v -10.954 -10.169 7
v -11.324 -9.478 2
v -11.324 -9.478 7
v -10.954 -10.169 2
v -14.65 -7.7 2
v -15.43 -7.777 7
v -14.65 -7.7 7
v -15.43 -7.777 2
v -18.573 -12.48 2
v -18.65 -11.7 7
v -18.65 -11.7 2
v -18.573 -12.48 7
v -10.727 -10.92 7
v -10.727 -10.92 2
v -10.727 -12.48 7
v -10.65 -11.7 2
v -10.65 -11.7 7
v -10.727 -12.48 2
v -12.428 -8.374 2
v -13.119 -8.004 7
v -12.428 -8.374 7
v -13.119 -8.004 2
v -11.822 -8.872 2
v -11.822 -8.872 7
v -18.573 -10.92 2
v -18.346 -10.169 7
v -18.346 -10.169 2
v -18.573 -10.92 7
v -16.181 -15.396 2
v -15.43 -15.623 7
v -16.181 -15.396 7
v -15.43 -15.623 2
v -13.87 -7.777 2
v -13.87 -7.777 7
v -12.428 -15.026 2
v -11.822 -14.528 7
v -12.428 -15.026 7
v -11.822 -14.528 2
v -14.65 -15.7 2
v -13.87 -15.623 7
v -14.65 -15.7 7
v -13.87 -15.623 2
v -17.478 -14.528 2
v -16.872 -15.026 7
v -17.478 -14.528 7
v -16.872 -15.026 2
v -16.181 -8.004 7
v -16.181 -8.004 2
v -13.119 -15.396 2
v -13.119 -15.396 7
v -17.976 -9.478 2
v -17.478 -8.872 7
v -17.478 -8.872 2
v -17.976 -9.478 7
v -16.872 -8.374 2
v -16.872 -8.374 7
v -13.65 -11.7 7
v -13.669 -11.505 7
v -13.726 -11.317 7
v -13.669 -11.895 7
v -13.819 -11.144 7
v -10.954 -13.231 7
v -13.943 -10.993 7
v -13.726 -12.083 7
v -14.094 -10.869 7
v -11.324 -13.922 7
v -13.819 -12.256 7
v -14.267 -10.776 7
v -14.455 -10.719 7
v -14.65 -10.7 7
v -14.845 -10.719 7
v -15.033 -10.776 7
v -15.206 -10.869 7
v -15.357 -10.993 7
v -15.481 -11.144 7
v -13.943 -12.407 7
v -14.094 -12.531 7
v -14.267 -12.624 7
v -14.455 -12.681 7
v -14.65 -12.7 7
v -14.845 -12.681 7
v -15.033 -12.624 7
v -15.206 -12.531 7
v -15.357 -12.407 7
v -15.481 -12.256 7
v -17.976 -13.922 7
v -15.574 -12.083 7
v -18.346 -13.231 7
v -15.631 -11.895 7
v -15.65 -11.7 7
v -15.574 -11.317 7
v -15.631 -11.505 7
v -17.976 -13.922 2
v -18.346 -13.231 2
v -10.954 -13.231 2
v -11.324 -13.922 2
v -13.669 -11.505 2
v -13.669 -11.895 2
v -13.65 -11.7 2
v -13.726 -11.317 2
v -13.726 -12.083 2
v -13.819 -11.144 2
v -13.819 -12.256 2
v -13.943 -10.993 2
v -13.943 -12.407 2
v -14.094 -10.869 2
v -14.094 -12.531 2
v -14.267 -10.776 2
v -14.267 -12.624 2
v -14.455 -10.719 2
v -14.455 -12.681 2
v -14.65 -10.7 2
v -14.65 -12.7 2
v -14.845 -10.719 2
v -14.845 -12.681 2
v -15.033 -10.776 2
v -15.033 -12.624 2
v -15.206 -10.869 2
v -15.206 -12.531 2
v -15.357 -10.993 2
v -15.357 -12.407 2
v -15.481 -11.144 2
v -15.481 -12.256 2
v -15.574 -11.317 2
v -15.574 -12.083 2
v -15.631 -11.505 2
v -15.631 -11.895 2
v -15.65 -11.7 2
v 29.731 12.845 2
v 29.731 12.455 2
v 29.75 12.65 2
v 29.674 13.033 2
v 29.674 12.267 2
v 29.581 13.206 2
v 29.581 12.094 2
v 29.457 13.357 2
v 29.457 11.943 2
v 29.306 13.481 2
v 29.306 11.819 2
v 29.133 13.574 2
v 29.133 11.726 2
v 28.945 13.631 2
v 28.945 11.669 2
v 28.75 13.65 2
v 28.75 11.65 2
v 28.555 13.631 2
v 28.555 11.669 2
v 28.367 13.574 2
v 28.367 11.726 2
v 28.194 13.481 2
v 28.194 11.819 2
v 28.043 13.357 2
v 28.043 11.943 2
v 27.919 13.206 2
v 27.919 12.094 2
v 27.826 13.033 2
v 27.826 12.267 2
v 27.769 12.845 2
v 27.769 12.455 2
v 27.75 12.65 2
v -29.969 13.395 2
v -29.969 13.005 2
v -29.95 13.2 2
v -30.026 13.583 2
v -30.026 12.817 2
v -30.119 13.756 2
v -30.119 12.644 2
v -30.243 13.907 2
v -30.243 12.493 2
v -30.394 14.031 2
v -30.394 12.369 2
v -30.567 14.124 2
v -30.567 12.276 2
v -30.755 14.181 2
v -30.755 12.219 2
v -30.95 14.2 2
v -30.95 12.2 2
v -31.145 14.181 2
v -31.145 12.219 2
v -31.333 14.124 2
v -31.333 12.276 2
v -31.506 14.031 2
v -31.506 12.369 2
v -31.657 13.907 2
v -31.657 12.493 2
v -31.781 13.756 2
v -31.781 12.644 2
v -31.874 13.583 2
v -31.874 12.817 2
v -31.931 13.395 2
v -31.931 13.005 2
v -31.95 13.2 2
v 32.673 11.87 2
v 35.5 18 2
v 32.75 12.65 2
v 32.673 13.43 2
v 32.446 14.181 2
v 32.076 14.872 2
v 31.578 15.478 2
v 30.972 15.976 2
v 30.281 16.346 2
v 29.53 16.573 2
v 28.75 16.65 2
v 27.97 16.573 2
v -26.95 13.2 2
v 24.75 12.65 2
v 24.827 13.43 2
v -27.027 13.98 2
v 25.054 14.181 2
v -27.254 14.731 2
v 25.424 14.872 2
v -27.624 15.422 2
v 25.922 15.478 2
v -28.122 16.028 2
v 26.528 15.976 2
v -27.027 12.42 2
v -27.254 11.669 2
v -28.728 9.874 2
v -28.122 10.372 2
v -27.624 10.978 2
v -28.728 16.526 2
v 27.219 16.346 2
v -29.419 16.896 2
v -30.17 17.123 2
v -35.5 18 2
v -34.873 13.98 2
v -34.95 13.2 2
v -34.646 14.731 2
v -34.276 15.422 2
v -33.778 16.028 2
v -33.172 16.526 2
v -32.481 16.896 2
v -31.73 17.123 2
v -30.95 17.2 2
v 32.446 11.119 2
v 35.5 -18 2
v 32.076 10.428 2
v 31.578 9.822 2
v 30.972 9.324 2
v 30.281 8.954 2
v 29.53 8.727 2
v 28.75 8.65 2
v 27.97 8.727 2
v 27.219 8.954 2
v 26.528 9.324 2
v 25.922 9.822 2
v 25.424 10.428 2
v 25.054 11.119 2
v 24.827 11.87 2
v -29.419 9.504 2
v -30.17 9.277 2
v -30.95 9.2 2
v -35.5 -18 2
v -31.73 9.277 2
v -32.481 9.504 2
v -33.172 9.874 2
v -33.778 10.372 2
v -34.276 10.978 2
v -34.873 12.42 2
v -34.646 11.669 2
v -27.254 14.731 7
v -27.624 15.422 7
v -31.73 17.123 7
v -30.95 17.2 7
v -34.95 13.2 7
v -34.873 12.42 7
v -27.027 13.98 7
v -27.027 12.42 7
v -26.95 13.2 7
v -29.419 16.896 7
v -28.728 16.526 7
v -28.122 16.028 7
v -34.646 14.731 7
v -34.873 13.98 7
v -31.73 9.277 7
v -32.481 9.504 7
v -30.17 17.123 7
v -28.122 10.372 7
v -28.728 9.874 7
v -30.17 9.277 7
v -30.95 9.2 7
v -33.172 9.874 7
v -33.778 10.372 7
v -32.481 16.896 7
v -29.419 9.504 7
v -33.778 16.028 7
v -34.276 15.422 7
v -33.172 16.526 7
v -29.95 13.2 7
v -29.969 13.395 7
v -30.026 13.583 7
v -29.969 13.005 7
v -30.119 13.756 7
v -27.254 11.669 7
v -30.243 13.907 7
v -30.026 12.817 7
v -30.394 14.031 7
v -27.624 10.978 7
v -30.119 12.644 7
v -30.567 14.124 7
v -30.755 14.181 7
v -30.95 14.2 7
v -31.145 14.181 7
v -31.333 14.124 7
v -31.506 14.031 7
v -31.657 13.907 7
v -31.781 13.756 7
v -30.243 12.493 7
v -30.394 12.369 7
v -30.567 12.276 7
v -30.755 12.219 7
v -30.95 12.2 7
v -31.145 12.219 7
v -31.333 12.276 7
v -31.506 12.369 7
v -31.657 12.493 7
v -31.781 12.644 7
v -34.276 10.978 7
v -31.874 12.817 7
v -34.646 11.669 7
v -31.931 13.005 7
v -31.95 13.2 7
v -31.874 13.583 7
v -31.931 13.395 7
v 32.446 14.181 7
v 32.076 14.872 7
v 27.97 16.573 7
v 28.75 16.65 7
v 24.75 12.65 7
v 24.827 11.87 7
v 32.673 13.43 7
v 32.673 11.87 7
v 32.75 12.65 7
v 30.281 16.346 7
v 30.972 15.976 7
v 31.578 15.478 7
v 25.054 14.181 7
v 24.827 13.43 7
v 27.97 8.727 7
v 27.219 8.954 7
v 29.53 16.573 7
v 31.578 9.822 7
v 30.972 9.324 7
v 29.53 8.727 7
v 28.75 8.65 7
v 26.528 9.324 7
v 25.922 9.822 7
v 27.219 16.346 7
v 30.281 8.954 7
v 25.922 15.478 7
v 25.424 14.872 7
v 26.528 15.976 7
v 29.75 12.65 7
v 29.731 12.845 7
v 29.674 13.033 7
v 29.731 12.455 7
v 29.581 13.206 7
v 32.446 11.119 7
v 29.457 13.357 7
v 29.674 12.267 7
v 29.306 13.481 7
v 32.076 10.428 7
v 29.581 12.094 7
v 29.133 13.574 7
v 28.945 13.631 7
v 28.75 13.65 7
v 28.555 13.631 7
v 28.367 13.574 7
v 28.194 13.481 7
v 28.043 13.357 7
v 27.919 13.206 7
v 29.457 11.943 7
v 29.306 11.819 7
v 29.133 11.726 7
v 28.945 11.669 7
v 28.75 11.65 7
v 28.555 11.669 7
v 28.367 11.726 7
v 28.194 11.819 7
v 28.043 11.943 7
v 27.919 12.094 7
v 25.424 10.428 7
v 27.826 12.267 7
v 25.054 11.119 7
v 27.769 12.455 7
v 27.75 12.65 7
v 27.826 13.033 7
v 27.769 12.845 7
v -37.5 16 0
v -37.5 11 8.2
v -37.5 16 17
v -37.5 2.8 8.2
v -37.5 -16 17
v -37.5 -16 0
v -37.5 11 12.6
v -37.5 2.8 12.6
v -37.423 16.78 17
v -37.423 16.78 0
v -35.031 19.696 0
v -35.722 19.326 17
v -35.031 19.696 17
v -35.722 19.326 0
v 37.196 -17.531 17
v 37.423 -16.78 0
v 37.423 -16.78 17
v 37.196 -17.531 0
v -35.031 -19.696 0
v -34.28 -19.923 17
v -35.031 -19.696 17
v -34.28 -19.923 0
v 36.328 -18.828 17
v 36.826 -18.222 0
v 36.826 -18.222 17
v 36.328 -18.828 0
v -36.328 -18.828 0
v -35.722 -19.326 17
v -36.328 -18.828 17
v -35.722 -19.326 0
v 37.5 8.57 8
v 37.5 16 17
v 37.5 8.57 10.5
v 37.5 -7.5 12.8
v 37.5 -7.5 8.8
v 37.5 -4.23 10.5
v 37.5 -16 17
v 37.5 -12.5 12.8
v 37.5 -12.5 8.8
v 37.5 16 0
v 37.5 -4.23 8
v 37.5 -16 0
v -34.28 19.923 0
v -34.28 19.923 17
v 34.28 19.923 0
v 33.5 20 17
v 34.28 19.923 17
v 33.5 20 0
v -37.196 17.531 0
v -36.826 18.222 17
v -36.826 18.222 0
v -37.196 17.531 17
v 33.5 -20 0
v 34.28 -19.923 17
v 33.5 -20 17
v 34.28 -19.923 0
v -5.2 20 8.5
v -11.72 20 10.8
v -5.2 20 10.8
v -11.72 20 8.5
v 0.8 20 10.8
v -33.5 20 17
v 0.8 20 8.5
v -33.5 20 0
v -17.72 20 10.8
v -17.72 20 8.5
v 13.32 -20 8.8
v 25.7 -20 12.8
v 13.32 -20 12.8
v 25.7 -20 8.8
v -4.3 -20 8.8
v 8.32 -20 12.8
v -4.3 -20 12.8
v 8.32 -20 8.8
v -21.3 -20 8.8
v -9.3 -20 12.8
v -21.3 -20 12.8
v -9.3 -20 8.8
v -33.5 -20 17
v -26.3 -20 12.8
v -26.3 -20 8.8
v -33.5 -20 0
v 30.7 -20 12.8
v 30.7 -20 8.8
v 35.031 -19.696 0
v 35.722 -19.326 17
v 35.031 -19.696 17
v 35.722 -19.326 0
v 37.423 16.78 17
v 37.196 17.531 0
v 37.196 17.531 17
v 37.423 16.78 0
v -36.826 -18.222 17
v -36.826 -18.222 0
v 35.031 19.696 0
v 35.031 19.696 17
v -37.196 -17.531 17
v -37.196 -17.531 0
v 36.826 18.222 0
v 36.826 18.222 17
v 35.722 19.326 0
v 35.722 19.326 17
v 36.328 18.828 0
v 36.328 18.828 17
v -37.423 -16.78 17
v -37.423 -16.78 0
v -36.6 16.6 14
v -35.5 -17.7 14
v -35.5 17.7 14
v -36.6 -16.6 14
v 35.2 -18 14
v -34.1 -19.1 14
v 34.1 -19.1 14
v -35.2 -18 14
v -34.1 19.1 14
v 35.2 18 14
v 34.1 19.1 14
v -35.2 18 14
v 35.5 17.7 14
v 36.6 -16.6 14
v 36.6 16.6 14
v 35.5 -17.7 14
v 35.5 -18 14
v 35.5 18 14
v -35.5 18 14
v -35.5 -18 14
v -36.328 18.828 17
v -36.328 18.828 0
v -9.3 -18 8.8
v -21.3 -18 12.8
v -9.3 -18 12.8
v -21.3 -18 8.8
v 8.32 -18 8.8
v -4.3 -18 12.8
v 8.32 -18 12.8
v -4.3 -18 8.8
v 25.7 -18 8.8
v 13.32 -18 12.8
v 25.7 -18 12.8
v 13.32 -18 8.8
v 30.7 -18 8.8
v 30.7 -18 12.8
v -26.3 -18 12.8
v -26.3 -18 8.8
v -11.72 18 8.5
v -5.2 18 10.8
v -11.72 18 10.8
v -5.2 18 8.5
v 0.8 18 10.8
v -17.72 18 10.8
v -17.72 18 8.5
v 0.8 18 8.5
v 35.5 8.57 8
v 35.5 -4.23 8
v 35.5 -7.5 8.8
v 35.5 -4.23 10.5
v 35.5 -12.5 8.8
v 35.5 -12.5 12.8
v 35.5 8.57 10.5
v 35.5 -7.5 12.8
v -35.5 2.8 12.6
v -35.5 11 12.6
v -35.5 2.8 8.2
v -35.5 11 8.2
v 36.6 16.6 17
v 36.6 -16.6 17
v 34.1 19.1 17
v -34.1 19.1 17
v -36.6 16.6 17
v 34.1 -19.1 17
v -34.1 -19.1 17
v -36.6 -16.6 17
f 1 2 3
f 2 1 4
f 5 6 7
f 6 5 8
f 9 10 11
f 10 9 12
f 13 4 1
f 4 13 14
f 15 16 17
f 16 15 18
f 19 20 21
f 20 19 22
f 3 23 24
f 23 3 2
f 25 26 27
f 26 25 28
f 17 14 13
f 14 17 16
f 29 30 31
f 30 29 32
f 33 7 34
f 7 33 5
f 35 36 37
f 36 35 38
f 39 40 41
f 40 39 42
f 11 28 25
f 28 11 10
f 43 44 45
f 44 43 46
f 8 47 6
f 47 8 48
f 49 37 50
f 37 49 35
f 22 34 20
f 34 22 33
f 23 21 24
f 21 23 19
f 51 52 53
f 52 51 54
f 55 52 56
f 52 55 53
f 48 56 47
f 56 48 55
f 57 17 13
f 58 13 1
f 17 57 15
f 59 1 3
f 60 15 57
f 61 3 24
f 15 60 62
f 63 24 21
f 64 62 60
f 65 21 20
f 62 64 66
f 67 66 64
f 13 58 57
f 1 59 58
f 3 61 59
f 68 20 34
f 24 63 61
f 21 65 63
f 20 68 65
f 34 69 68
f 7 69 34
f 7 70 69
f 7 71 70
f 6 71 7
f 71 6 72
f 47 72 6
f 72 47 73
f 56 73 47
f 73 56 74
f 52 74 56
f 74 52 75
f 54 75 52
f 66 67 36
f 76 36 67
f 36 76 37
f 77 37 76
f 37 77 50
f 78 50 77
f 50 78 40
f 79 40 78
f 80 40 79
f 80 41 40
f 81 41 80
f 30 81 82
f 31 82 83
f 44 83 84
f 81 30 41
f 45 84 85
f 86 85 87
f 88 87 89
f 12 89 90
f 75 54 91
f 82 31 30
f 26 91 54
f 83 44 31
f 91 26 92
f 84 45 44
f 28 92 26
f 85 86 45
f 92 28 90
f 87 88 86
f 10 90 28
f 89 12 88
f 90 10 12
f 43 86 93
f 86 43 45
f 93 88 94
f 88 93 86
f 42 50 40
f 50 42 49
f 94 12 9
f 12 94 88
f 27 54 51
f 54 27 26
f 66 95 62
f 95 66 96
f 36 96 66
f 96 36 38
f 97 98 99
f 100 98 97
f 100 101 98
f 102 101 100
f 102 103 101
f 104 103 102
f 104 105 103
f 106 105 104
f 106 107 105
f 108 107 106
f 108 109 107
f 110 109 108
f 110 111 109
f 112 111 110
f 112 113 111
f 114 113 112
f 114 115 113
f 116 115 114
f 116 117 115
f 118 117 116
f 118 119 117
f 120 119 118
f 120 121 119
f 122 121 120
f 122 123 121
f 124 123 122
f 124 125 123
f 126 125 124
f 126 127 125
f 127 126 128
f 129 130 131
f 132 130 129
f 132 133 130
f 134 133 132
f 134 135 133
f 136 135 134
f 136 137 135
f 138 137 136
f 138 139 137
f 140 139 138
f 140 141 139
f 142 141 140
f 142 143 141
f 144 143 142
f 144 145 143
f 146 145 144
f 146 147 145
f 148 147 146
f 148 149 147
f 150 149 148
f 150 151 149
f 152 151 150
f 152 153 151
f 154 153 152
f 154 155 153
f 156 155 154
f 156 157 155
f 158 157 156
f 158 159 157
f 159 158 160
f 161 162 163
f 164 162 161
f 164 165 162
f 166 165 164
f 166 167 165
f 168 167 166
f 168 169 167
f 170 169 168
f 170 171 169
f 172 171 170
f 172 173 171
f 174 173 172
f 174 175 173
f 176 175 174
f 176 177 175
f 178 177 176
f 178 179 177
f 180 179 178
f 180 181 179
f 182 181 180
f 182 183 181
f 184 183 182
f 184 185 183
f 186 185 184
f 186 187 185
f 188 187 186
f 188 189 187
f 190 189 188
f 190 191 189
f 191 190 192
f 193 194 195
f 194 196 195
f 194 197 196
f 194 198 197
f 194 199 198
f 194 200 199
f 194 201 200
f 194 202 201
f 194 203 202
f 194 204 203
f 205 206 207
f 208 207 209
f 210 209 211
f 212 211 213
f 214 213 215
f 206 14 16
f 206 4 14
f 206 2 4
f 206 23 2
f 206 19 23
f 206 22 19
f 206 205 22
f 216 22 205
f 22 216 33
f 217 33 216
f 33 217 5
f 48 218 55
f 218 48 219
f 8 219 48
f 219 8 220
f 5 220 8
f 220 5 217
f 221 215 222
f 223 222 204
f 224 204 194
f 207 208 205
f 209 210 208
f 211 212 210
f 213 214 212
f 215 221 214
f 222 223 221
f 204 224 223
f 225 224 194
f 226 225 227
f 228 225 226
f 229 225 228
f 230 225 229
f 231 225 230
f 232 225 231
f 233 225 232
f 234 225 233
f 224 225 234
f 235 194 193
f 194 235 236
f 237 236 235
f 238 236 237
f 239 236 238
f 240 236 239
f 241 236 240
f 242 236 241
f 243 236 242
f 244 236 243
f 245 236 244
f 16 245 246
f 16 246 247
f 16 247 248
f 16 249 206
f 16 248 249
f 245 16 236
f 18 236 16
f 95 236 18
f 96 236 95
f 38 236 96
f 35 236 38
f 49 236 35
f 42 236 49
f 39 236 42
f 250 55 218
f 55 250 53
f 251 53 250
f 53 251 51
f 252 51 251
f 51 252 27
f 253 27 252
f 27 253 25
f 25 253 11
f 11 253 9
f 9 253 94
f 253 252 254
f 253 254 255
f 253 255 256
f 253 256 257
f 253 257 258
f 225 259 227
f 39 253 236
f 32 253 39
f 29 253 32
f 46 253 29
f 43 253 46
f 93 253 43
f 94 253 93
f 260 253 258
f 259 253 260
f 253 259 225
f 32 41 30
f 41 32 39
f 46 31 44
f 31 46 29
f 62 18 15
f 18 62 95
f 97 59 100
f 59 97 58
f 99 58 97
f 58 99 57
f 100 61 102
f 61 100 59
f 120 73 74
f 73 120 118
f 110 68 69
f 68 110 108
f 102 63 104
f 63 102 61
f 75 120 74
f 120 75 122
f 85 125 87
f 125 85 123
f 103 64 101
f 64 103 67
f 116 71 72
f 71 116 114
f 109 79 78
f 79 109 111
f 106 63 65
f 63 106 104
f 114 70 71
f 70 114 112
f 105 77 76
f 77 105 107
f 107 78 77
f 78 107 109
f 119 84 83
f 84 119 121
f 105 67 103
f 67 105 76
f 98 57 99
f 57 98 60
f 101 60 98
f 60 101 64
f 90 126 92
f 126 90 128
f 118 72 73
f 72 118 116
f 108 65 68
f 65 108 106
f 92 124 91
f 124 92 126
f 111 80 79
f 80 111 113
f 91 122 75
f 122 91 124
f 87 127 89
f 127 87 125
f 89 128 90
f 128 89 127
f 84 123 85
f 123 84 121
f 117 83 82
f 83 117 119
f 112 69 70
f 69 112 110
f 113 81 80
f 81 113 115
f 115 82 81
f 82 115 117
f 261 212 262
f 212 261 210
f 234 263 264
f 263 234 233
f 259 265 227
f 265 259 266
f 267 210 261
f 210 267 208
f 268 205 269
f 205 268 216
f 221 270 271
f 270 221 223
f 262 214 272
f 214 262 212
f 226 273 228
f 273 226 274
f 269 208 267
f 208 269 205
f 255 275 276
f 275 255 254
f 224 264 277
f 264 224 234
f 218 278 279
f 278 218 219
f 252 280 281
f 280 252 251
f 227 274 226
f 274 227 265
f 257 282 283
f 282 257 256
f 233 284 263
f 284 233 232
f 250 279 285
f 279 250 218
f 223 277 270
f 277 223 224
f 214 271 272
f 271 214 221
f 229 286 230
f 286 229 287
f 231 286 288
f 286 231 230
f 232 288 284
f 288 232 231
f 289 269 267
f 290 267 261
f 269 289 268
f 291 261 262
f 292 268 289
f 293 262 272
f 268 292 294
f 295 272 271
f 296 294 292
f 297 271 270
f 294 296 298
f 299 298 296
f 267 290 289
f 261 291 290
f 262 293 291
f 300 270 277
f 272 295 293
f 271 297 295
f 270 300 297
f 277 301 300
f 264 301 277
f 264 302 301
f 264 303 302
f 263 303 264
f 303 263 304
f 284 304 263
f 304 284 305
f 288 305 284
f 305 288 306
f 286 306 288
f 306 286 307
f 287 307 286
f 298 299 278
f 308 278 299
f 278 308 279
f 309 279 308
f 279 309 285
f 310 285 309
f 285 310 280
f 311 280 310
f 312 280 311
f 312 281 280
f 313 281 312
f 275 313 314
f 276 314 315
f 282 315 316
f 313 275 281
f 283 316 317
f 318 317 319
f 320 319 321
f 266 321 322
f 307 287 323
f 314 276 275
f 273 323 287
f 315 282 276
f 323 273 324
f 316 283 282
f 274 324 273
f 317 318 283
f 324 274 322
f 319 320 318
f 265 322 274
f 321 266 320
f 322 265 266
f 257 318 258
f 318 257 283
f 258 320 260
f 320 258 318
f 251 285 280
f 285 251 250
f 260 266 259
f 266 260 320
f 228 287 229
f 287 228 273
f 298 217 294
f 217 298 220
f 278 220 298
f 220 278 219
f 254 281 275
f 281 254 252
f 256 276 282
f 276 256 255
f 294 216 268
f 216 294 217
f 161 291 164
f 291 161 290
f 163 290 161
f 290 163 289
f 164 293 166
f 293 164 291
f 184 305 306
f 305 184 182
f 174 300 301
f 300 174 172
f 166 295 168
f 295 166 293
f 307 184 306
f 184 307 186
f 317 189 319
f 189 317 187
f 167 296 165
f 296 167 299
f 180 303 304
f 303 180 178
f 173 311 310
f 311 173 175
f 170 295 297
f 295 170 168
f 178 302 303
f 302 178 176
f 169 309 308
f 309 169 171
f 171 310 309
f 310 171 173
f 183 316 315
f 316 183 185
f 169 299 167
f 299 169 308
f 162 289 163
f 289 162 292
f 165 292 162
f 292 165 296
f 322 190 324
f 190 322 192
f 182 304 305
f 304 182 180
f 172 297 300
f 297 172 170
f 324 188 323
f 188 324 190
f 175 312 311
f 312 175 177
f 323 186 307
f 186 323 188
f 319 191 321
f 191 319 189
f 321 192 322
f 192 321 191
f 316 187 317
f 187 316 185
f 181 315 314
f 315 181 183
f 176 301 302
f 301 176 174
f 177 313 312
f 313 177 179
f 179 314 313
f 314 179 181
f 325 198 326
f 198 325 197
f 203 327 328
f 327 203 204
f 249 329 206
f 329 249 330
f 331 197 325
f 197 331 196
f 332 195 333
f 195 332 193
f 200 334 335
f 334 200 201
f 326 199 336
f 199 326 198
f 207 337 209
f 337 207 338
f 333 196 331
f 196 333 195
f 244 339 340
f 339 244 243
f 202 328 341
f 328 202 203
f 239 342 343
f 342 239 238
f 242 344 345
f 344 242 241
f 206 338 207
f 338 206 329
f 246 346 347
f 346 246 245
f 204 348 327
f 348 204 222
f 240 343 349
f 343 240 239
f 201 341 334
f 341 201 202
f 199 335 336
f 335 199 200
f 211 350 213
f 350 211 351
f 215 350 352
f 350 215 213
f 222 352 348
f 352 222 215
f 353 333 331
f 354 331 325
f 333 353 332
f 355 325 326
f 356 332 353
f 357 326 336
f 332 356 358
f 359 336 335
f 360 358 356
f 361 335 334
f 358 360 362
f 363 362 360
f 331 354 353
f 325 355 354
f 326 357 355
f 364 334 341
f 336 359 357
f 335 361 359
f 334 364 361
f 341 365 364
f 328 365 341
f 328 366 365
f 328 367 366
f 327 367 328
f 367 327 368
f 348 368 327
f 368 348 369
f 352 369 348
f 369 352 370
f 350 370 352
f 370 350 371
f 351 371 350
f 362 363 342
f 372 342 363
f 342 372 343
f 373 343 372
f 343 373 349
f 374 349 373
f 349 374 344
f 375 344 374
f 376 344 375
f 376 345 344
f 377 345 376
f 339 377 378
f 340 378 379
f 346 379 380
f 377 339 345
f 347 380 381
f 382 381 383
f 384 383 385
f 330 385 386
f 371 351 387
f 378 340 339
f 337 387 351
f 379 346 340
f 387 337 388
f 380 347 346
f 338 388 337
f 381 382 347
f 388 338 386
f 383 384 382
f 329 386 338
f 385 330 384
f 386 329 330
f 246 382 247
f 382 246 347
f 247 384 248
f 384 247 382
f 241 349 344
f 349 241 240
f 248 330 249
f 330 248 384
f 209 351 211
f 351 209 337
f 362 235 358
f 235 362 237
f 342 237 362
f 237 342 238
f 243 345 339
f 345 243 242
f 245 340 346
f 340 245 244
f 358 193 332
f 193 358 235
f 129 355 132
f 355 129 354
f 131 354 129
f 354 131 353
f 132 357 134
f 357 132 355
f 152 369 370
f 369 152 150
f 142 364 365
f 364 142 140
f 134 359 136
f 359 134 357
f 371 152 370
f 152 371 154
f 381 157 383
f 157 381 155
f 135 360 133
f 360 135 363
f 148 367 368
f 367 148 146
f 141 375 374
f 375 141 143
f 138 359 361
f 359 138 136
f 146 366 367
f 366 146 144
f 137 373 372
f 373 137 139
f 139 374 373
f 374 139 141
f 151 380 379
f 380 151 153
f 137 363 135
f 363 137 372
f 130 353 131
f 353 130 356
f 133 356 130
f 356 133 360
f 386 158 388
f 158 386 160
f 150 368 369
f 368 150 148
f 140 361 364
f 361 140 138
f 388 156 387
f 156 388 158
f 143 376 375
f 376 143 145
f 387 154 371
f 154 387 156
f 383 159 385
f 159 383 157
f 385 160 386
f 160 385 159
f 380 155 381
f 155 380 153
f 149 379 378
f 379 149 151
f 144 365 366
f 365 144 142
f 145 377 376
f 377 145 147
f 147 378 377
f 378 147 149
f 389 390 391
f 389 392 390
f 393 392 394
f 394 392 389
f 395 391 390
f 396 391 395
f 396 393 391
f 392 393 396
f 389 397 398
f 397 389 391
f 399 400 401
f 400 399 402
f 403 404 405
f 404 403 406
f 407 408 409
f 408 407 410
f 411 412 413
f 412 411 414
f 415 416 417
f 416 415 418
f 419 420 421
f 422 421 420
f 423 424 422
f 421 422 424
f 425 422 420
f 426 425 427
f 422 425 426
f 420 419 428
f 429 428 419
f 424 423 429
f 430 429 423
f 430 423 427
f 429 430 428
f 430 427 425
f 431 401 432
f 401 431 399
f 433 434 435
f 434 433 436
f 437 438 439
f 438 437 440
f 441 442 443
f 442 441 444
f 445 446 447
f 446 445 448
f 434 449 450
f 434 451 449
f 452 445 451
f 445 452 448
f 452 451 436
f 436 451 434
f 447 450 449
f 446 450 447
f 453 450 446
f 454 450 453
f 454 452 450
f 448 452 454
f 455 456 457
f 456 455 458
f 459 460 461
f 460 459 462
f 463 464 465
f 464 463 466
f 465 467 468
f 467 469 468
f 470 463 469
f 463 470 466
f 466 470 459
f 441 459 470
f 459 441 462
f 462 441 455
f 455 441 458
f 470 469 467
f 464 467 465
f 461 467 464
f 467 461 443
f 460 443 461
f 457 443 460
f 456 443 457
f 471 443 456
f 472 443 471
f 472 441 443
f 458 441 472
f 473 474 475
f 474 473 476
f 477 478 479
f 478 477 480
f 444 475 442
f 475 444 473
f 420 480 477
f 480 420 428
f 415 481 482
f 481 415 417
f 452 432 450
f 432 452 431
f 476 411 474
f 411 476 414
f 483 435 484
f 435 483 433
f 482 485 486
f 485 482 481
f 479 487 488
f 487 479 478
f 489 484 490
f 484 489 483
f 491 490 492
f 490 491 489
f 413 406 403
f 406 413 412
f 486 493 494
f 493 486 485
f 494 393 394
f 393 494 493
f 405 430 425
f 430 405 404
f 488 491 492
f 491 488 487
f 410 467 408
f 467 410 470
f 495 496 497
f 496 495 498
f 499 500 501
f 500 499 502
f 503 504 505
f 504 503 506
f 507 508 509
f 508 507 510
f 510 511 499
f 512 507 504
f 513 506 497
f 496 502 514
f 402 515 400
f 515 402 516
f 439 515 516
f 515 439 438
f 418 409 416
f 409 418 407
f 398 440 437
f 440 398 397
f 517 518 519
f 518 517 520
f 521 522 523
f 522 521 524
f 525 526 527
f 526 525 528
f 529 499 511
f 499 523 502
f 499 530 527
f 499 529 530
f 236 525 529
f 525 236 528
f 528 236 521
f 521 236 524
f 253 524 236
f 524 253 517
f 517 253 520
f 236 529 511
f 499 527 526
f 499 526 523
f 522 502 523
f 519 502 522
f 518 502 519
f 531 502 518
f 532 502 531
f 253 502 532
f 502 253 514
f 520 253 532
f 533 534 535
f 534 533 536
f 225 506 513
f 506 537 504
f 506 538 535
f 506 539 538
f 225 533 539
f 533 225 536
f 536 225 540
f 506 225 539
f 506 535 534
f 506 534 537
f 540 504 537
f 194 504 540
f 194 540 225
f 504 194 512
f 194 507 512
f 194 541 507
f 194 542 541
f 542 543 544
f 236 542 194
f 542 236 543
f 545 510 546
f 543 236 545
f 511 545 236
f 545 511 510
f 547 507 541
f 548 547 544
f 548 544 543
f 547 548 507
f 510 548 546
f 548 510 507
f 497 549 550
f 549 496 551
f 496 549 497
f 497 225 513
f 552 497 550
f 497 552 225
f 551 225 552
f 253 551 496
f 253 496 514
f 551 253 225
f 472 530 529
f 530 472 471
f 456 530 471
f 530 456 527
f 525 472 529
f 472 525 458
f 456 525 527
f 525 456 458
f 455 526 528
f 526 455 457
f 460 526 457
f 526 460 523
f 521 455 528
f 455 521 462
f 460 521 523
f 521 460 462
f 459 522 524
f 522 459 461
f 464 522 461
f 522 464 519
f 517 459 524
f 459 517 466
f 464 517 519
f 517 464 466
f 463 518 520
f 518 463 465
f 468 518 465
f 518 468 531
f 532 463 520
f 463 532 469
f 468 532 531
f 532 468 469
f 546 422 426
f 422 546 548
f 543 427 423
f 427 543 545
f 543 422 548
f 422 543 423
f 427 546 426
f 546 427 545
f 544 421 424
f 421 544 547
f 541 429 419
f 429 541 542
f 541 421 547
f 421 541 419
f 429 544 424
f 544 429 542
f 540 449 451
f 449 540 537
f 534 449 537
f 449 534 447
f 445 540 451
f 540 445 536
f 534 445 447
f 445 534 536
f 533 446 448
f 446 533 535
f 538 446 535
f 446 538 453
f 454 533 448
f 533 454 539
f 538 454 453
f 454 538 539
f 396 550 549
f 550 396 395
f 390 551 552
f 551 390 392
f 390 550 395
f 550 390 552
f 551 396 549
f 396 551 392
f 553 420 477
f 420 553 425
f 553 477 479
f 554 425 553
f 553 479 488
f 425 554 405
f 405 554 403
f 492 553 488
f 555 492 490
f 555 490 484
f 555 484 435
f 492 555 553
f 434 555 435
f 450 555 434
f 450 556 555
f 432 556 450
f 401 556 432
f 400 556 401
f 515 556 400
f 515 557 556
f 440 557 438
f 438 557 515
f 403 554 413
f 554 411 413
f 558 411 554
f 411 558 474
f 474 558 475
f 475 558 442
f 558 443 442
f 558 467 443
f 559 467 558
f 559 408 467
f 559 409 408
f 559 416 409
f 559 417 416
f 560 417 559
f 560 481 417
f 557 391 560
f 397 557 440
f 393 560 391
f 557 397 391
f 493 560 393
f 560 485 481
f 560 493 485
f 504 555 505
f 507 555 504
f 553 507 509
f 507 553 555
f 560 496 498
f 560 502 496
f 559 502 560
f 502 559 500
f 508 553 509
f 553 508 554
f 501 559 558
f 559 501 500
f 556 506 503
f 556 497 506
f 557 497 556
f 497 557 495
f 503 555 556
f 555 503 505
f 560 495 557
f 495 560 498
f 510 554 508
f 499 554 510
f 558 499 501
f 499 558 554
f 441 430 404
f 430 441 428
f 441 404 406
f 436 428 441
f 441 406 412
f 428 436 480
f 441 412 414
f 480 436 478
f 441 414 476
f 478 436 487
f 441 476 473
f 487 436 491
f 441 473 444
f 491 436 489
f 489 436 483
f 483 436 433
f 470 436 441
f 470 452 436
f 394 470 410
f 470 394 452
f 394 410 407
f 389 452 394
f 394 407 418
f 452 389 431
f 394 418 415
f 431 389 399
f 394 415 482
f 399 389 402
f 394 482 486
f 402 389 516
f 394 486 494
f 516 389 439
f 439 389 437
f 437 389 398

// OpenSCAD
// based on Parametric and Customizable Project Enclosure by ffleurey is licensed under the Creative Commons - Attribution - Non-Commercial license. 
// https://www.thingiverse.com/thing:155001/

enclosure_inner_length = 71;
enclosure_inner_width = 36;
enclosure_inner_depth = 12;

enclosure_thickness = 2;

cover_thickness = 3;

part = "enclosure"; // [enclosure:Enclosure, cover:Cover, both:Enclosure and Cover]

print_part();

module print_part() {
	if (part == "enclosure" || part == "both") {
		box2(enclosure_inner_length,enclosure_inner_width,enclosure_inner_depth,enclosure_thickness,enclosure_thickness/2-0.10,cover_thickness);
	}
    if (part == "cover" || part == "both") {
		lid2(enclosure_inner_length,enclosure_inner_width,enclosure_inner_depth,enclosure_thickness,enclosure_thickness/2+0.10,cover_thickness);
	}
}

module bottom(in_x, in_y, in_z, shell) {
	hull() {
   	 	translate([-in_x/2+shell, -in_y/2+shell, 0]) cylinder(r=shell*2,h=shell, $fn=32);
		translate([+in_x/2-shell, -in_y/2+shell, 0]) cylinder(r=shell*2,h=shell, $fn=32);
		translate([+in_x/2-shell, in_y/2-shell, 0]) cylinder(r=shell*2,h=shell, $fn=32);
		translate([-in_x/2+shell, in_y/2-shell, 0]) cylinder(r=shell*2,h=shell, $fn=32);
	}
}

module sides(in_x, in_y, in_z, shell) {
    // screwholes
    translate([-14.65,-11.7,shell]) 
    difference() {
      cylinder(r=4,h=5, $fn=32);
      cylinder(r=1,h=5, $fn=32);
    };
    
    translate([-30.95,13.2,shell]) 
    difference() {
      cylinder(r=4,h=5, $fn=32);
      cylinder(r=1,h=5, $fn=32);
    };
    
    translate([28.75,12.65,shell]) 
    difference() {
      cylinder(r=4,h=5, $fn=32);
      cylinder(r=1,h=5, $fn=32);
    };
    
translate([0,0,shell]) 
difference(){
    difference() {
        hull() {
            translate([-in_x/2+shell, -in_y/2+shell, 0]) cylinder(r=shell*2,h=in_z, $fn=32);
            translate([+in_x/2-shell, -in_y/2+shell, 0]) cylinder(r=shell*2,h=in_z, $fn=32);
            translate([+in_x/2-shell, in_y/2-shell, 0]) cylinder(r=shell*2,h=in_z, $fn=32);
            translate([-in_x/2+shell, in_y/2-shell, 0]) cylinder(r=shell*2,h=in_z, $fn=32);
        }
        hull() {
            translate([-in_x/2+shell, -in_y/2+shell, in_z/2]) cube([shell*2, shell*2, in_z], true);
            translate([+in_x/2-shell, -in_y/2+shell, in_z/2]) cube([shell*2, shell*2, in_z],true);
            translate([+in_x/2-shell, in_y/2-shell, in_z/2]) cube([shell*2, shell*2, in_z],true);
            translate([-in_x/2+shell, in_y/2-shell, in_z/2]) cube([shell*2, shell*2, in_z],true);
        }
    }
    union() {
        translate([25.7,-in_y/2-shell,6.8]) cube([5,3,4]);  // button 1
        translate([8.32,-in_y/2-shell,6.8]) cube([5,3,4]);// button 2
        translate([-9.3,-in_y/2-shell,6.8]) cube([5,3,4]);  // button 3
        translate([-26.3,-in_y/2-shell,6.8]) cube([5,3,4]); // button 4
        translate([in_x/2-shell,-12.5,6.8]) cube([4,5,4]);// button 5
        translate([in_x/2-shell,-4.23,6]) cube([4,12.8,2.5]); // microsd
        translate([-5.2,in_y/2,6.5]) cube([6,3,2.3]);           // pwr switch
        translate([-17.72,in_y/2,6.5]) cube([6,3,2.3]);         // rf switch
        translate([-in_x/2-shell,2.8,6.2]) cube([4,8.2,4.4]);   // usb port
    }
}
}

module lid_top_lip2(in_x, in_y, in_z, shell, top_lip, top_thickness) {
	cxm = -in_x/2 - (shell-top_lip);
	cxp = in_x/2 + (shell-top_lip);
	cym = -in_y/2 - (shell-top_lip);
	cyp = in_y/2 + (shell-top_lip);

	translate([0,0,shell+in_z])

    difference() {

        hull() {
            translate([-in_x/2+shell, -in_y/2+shell, 0]) cylinder(r=shell*2,h=top_thickness, $fn=32);
            translate([+in_x/2-shell, -in_y/2+shell, 0]) cylinder(r=shell*2,h=top_thickness, $fn=32);
            translate([+in_x/2-shell, in_y/2-shell, 0]) cylinder(r=shell*2,h=top_thickness, $fn=32);
            translate([-in_x/2+shell, in_y/2-shell, 0]) cylinder(r=shell*2,h=top_thickness, $fn=32);
        }
	
        translate([0, 0, -1]) linear_extrude(height = top_thickness + 2) polygon(points = [
            [cxm+2.5, cym],
            [cxm, cym+2.5],
            [cxm, cyp-2.5],
            [cxm+2.5, cyp],
            [cxp-2.5, cyp],
            [cxp, cyp-2.5],
            [cxp, cym+2.5],
            [cxp-2.5, cym]]);
    }
}

module lid2(in_x, in_y, in_z, shell, top_lip, top_thickness) {
	cxm = -in_x/2 - (shell-top_lip);
	cxp = in_x/2 + (shell-top_lip);
	cym = -in_y/2 - (shell-top_lip);
	cyp = in_y/2 + (shell-top_lip);	

    difference() {
        translate([0, 0, in_z+shell]) linear_extrude(height = top_thickness ) polygon(points = [
            [cxm+5, cym],
            [cxm, cym+5],
            [cxm, cyp-5],
            [cxm+5, cyp],
            [cxp-5, cyp],
            [cxp, cyp-5],
            [cxp, cym+5],
            [cxp-5, cym]]);
    }
}

module box2(in_x, in_y, in_z, shell, top_lip, top_thickness) {
	bottom(in_x, in_y, in_z, shell);
	difference() {
		sides(in_x, in_y, in_z, shell);
	}
    lid_top_lip2(in_x, in_y, in_z, shell, top_lip, top_thickness);
}
